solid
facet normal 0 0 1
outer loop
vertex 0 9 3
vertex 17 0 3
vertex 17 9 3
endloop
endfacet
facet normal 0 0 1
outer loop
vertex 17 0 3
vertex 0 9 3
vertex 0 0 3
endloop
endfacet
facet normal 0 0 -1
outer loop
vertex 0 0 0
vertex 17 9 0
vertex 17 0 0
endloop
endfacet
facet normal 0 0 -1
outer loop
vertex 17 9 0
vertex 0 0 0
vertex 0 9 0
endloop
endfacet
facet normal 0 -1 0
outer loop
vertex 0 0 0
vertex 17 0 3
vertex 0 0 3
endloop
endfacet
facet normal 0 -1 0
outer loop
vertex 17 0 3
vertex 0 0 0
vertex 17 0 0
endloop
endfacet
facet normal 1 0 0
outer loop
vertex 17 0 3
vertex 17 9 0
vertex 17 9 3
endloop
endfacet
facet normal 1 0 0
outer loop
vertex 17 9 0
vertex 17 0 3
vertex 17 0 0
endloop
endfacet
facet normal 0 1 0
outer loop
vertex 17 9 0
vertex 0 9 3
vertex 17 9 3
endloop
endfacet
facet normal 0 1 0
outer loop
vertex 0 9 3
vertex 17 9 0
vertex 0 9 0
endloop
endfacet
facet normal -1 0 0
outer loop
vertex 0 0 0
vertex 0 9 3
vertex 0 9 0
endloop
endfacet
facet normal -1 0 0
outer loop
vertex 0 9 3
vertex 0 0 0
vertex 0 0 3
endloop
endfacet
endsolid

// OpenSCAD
// Generated by SolidPython 1.0.1 on 2020-07-29 00:46:56


cube(size = [17, 9, 3]);
/***********************************************
*********      SolidPython code:      **********
************************************************
 
# import packages: SolidPython
from solid import *
from solid.utils import *
from itertools import chain, combinations, permutations


class Resize:

    def __init__(self, scad_file):
        self.scad_file = scad_file
        #self.scad_file = import_scad(scad_file)
        # cone/cylinder param:
        self.r1 = 0
        self.r2 = 0
        self.h = 0
        # rectangular prism param:
        self.w = 0
        self.l = 0
        # ellipse param:
        self.r = 0

    # import OpenScad code (file name corresponds to shape)


    # classify shape + parameters
    def assign(self, param1, param2, param3):
        if self.scad_file == 'cone.scad':
            self.r1 = param1
            self.r2 = param2
            self.h = param3
        elif self.scad_file == 'cylinder.scad':
            self.r1 = param1
            self.r2 = param2
            self.h = param3
        elif self.scad_file == 'rectangularPrism.scad':
            self.h = param1
            self.l = param2
            self.w = param3
        else:
            self.r = param1
            self.h = param2

    # resize parameters
    def iterate(self):
        x = range(3, 20, 2)
        i = 1
        if self.scad_file == 'cone.scad':
            tempList = list(permutations(x, 2))
            for temp in tempList:
                param1 = temp[0]
                param2 = temp[1]
                filepath = 'produced_scad_files/' + 'cone' + str(param1) + '_' + str(param2) + '_' + '.scad'
                scad_render_to_file(cylinder(h=param1, r1=param2, r2=0), filepath)

        elif self.scad_file == 'cylinder.scad':
            tempList = list(permutations(x, 3))
            for temp in tempList:
                param1 = temp[0]
                param2 = temp[1]
                filepath = 'produced_scad_files/' + 'cylinder' + str(param1) + '_' + str(param2) + '_' + '.scad'
                scad_render_to_file(cylinder(h=param1, r1=param2, r2=param2), filepath)

        elif self.scad_file == 'rectangularPrism.scad':
            tempList = list(permutations(x, 3))
            for temp in tempList:
                param1 = temp[0]
                param2 = temp[1]
                param3 = temp[2]
                filepath = 'produced_scad_files/' + 'rectangularPrism' + str(param1) + '_' + str(param2) + '_' + str(
                    param3) + '.scad'
                scad_render_to_file(cube(size=(param1, param2, param3)), filepath)

        elif self.scad_file == 'ellipse.scad':
            tempList = list(permutations(x, 4))
            for temp in tempList:
                param1 = temp[0]
                param2 = temp[1]
                param3 = temp[2]
                param4 = temp[3]
                filepath = 'produced_scad_files/' + 'ellipse' + str(param1) + '_' + str(param2) + '_' + str(param3) + '_' + str(param4) + '.scad'
                scad_render_to_file(scale([param1, param2, param3])(sphere(r=param4)), filepath)

    def render_to_scadfile(self):
        scad_render_to_file(scad, 'example.scad') 
 
************************************************/
